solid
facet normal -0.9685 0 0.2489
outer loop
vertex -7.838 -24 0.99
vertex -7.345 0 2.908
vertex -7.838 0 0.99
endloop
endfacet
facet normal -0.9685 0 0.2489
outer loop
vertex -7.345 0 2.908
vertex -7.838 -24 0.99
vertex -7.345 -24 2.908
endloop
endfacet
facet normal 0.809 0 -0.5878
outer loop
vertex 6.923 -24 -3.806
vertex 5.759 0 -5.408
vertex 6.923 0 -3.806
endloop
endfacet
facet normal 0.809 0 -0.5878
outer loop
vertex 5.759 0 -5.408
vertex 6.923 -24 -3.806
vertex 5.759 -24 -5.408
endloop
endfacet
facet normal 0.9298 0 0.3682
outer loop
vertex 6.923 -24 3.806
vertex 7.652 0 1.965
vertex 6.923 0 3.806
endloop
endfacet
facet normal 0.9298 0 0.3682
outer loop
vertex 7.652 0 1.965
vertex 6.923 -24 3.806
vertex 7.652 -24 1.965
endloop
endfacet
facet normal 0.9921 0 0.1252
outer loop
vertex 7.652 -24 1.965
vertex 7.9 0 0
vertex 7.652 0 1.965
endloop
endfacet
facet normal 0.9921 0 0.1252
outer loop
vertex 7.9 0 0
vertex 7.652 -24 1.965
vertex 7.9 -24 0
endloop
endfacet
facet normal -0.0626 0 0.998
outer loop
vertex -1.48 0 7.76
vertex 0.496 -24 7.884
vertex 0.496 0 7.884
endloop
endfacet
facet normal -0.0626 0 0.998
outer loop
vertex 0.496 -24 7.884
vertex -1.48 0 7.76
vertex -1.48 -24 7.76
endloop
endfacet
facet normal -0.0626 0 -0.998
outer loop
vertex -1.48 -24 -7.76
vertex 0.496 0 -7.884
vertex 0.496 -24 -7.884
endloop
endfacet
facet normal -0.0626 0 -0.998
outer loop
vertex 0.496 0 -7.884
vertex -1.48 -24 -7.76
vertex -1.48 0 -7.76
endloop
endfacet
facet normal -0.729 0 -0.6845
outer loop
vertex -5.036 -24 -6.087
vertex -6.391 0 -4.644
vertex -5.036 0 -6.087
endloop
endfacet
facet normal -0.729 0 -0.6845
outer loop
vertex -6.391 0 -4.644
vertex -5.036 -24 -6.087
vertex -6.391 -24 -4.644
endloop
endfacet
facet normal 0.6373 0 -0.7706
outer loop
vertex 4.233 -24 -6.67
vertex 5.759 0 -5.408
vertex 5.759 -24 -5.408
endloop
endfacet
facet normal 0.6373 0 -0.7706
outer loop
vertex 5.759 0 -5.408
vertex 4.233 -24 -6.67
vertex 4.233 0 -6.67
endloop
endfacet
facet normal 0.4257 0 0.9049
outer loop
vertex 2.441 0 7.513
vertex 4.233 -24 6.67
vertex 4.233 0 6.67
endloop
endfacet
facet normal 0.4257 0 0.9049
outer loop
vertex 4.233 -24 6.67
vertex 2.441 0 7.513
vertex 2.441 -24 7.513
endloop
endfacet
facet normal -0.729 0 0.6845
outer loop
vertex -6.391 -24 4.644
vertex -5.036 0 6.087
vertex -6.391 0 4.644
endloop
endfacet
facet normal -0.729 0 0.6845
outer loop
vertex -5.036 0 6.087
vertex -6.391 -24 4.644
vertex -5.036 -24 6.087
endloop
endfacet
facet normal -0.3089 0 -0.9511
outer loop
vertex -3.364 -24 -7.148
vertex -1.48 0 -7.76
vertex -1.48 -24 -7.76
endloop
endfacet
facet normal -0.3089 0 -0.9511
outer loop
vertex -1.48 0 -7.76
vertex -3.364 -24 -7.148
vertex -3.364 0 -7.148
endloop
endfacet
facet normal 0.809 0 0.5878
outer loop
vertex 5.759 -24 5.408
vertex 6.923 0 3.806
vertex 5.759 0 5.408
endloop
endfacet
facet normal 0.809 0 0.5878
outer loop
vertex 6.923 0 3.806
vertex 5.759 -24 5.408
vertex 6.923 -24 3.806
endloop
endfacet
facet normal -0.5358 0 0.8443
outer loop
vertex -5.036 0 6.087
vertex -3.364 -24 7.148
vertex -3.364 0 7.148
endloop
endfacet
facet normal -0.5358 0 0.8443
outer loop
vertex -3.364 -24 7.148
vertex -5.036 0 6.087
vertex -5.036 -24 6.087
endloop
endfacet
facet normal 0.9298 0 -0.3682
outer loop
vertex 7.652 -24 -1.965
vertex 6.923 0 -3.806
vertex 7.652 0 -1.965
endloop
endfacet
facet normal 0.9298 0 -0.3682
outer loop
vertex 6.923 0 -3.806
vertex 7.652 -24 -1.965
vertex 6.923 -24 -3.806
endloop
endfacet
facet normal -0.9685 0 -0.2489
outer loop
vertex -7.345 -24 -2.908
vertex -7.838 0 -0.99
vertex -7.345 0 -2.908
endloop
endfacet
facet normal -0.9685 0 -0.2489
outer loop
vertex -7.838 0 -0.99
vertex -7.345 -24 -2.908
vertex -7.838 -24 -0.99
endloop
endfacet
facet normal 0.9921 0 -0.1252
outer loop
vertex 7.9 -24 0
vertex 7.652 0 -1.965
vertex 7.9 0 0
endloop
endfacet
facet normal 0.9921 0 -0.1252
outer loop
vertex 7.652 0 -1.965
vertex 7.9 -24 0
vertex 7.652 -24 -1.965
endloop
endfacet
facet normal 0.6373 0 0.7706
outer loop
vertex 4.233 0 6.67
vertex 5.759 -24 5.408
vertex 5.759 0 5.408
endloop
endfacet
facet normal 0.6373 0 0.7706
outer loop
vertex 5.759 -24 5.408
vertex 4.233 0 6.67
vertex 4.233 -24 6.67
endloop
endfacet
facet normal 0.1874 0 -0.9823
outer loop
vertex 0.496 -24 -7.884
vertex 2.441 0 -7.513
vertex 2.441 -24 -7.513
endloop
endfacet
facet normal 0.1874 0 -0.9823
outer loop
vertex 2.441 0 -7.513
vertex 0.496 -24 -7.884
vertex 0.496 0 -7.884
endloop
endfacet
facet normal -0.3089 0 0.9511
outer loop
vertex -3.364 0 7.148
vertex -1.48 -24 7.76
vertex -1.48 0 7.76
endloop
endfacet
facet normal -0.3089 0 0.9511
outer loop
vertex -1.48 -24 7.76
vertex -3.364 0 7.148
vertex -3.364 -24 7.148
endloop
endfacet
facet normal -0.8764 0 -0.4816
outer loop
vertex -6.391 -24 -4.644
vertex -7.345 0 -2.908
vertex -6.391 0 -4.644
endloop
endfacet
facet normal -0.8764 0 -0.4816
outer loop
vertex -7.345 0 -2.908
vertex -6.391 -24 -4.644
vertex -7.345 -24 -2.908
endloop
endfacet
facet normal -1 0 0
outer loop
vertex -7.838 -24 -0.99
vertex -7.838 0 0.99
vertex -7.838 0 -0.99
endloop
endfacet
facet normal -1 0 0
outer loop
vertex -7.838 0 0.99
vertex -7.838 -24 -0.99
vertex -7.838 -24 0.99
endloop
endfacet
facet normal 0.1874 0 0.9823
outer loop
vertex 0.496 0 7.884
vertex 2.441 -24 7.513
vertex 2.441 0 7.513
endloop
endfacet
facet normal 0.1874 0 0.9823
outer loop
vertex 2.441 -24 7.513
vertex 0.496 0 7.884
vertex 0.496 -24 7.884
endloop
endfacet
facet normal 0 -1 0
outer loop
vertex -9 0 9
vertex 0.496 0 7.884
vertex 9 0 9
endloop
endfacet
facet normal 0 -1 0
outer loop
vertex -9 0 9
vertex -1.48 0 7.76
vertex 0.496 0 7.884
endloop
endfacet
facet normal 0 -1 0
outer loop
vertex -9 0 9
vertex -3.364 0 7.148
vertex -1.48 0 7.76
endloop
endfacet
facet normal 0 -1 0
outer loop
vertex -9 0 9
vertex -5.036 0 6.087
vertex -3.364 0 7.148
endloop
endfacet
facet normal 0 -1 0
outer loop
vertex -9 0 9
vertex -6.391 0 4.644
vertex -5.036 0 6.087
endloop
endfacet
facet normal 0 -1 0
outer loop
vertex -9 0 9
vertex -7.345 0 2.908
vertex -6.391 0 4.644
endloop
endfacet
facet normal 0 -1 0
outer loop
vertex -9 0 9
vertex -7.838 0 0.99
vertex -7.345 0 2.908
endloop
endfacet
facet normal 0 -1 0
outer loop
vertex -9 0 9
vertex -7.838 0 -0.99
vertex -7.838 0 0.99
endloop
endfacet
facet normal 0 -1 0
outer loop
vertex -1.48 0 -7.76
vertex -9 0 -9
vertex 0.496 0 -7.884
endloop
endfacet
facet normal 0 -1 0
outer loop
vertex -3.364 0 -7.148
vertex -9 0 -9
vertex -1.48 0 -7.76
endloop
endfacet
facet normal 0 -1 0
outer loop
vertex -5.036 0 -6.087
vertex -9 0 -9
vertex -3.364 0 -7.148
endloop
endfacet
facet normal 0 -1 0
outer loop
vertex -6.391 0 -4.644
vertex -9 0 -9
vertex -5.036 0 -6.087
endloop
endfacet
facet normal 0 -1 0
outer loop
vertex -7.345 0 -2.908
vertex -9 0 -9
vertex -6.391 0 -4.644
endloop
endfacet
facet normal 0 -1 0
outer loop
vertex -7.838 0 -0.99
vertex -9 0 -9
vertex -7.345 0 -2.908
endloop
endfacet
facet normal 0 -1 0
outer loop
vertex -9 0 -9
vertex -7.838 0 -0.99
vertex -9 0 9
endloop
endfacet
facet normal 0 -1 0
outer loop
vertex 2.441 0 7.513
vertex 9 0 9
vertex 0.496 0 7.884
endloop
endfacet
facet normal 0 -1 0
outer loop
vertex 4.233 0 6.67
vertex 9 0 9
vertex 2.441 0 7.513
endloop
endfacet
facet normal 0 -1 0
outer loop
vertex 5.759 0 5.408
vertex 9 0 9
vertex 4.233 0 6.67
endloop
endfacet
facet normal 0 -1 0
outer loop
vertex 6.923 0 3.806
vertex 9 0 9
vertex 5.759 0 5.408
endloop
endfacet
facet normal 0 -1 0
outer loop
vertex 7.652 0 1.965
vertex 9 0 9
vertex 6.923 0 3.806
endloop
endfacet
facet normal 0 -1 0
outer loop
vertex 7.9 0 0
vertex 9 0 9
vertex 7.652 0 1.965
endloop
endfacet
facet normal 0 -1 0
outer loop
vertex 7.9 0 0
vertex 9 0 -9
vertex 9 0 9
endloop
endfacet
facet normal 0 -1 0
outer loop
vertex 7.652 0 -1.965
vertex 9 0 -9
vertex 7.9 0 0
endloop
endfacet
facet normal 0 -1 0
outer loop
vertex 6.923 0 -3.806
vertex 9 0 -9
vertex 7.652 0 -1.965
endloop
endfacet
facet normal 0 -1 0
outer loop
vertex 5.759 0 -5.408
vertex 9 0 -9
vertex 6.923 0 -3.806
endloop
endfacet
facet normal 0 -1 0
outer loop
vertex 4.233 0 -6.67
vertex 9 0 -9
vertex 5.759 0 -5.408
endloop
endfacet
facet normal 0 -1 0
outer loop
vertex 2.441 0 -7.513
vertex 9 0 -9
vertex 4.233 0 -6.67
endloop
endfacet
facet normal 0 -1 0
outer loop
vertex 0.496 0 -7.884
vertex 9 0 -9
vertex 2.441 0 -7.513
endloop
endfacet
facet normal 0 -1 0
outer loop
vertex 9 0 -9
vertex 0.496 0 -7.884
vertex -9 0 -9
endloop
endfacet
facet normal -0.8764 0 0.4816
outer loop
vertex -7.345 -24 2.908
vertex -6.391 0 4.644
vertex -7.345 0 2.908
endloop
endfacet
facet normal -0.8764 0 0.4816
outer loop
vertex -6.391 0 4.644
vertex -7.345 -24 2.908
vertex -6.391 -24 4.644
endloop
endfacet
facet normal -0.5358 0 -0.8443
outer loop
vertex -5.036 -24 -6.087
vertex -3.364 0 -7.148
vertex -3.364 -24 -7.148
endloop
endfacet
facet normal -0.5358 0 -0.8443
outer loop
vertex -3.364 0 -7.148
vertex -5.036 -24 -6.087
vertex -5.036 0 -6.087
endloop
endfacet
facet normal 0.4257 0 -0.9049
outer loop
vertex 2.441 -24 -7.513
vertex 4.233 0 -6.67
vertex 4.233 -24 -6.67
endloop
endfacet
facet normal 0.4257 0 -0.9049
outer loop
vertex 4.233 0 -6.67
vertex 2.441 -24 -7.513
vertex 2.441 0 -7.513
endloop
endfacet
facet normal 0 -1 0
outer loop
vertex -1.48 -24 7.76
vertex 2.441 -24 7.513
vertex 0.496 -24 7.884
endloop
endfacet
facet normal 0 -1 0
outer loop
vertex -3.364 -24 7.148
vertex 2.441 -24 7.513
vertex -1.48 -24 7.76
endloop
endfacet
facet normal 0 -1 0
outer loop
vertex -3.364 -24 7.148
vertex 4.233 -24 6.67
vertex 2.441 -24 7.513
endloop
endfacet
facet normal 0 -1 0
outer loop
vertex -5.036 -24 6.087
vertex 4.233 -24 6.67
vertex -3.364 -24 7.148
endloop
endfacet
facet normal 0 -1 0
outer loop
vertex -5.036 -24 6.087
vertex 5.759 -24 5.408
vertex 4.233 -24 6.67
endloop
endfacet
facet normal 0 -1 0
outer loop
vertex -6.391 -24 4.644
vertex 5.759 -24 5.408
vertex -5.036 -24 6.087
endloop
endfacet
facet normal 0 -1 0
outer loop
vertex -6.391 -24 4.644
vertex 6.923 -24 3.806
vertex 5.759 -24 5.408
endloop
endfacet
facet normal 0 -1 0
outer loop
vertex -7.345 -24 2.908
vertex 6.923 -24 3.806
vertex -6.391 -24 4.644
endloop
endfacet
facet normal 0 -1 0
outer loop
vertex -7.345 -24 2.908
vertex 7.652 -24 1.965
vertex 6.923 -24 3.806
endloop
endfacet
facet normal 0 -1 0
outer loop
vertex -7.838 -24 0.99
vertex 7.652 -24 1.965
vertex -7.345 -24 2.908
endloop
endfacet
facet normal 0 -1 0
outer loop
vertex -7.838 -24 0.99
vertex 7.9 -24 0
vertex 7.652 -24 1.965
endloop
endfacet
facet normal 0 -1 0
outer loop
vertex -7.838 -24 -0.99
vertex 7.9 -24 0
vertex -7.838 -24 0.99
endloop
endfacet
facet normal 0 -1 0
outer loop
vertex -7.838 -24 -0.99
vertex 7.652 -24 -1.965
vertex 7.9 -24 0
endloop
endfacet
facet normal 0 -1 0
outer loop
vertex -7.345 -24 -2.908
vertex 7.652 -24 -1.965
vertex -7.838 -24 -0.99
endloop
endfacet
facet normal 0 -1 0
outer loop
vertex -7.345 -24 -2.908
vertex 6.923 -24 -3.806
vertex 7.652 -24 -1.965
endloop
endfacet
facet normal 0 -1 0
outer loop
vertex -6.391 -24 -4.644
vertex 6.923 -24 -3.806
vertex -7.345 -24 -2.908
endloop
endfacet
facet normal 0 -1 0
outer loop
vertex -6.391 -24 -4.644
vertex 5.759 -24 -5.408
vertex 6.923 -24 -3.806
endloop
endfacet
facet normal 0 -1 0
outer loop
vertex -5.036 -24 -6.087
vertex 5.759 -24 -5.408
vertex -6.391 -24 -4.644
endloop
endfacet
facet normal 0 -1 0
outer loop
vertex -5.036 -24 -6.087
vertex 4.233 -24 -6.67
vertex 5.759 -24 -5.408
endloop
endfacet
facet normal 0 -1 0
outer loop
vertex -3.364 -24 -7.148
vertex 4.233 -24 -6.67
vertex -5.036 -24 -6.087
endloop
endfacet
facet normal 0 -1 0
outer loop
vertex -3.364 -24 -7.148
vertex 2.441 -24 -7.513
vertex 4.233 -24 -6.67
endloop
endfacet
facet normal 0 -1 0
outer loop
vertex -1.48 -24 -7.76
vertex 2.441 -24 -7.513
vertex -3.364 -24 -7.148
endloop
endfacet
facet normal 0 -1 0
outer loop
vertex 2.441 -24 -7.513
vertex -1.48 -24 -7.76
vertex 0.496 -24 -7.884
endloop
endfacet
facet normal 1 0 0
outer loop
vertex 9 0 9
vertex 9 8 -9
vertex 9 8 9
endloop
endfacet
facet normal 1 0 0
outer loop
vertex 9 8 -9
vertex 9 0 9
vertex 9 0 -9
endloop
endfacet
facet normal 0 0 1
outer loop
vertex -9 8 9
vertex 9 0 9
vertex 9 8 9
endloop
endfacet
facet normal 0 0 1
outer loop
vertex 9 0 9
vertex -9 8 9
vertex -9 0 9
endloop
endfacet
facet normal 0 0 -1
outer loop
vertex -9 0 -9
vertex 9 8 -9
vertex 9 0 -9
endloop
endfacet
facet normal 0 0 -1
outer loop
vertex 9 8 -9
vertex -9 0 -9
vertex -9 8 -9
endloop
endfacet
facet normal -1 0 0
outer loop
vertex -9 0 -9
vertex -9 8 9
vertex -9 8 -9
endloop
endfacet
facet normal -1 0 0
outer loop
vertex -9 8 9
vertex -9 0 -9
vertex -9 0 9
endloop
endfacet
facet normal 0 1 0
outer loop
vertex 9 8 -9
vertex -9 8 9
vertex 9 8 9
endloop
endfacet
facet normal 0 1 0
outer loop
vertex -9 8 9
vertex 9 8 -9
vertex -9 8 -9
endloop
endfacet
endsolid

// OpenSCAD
module power_btn(){
    rotate([90]) cylinder(24, r=15.8/2);
    translate([-9, 0, -9]) cube([18, 8, 18]);
}

power_btn();
